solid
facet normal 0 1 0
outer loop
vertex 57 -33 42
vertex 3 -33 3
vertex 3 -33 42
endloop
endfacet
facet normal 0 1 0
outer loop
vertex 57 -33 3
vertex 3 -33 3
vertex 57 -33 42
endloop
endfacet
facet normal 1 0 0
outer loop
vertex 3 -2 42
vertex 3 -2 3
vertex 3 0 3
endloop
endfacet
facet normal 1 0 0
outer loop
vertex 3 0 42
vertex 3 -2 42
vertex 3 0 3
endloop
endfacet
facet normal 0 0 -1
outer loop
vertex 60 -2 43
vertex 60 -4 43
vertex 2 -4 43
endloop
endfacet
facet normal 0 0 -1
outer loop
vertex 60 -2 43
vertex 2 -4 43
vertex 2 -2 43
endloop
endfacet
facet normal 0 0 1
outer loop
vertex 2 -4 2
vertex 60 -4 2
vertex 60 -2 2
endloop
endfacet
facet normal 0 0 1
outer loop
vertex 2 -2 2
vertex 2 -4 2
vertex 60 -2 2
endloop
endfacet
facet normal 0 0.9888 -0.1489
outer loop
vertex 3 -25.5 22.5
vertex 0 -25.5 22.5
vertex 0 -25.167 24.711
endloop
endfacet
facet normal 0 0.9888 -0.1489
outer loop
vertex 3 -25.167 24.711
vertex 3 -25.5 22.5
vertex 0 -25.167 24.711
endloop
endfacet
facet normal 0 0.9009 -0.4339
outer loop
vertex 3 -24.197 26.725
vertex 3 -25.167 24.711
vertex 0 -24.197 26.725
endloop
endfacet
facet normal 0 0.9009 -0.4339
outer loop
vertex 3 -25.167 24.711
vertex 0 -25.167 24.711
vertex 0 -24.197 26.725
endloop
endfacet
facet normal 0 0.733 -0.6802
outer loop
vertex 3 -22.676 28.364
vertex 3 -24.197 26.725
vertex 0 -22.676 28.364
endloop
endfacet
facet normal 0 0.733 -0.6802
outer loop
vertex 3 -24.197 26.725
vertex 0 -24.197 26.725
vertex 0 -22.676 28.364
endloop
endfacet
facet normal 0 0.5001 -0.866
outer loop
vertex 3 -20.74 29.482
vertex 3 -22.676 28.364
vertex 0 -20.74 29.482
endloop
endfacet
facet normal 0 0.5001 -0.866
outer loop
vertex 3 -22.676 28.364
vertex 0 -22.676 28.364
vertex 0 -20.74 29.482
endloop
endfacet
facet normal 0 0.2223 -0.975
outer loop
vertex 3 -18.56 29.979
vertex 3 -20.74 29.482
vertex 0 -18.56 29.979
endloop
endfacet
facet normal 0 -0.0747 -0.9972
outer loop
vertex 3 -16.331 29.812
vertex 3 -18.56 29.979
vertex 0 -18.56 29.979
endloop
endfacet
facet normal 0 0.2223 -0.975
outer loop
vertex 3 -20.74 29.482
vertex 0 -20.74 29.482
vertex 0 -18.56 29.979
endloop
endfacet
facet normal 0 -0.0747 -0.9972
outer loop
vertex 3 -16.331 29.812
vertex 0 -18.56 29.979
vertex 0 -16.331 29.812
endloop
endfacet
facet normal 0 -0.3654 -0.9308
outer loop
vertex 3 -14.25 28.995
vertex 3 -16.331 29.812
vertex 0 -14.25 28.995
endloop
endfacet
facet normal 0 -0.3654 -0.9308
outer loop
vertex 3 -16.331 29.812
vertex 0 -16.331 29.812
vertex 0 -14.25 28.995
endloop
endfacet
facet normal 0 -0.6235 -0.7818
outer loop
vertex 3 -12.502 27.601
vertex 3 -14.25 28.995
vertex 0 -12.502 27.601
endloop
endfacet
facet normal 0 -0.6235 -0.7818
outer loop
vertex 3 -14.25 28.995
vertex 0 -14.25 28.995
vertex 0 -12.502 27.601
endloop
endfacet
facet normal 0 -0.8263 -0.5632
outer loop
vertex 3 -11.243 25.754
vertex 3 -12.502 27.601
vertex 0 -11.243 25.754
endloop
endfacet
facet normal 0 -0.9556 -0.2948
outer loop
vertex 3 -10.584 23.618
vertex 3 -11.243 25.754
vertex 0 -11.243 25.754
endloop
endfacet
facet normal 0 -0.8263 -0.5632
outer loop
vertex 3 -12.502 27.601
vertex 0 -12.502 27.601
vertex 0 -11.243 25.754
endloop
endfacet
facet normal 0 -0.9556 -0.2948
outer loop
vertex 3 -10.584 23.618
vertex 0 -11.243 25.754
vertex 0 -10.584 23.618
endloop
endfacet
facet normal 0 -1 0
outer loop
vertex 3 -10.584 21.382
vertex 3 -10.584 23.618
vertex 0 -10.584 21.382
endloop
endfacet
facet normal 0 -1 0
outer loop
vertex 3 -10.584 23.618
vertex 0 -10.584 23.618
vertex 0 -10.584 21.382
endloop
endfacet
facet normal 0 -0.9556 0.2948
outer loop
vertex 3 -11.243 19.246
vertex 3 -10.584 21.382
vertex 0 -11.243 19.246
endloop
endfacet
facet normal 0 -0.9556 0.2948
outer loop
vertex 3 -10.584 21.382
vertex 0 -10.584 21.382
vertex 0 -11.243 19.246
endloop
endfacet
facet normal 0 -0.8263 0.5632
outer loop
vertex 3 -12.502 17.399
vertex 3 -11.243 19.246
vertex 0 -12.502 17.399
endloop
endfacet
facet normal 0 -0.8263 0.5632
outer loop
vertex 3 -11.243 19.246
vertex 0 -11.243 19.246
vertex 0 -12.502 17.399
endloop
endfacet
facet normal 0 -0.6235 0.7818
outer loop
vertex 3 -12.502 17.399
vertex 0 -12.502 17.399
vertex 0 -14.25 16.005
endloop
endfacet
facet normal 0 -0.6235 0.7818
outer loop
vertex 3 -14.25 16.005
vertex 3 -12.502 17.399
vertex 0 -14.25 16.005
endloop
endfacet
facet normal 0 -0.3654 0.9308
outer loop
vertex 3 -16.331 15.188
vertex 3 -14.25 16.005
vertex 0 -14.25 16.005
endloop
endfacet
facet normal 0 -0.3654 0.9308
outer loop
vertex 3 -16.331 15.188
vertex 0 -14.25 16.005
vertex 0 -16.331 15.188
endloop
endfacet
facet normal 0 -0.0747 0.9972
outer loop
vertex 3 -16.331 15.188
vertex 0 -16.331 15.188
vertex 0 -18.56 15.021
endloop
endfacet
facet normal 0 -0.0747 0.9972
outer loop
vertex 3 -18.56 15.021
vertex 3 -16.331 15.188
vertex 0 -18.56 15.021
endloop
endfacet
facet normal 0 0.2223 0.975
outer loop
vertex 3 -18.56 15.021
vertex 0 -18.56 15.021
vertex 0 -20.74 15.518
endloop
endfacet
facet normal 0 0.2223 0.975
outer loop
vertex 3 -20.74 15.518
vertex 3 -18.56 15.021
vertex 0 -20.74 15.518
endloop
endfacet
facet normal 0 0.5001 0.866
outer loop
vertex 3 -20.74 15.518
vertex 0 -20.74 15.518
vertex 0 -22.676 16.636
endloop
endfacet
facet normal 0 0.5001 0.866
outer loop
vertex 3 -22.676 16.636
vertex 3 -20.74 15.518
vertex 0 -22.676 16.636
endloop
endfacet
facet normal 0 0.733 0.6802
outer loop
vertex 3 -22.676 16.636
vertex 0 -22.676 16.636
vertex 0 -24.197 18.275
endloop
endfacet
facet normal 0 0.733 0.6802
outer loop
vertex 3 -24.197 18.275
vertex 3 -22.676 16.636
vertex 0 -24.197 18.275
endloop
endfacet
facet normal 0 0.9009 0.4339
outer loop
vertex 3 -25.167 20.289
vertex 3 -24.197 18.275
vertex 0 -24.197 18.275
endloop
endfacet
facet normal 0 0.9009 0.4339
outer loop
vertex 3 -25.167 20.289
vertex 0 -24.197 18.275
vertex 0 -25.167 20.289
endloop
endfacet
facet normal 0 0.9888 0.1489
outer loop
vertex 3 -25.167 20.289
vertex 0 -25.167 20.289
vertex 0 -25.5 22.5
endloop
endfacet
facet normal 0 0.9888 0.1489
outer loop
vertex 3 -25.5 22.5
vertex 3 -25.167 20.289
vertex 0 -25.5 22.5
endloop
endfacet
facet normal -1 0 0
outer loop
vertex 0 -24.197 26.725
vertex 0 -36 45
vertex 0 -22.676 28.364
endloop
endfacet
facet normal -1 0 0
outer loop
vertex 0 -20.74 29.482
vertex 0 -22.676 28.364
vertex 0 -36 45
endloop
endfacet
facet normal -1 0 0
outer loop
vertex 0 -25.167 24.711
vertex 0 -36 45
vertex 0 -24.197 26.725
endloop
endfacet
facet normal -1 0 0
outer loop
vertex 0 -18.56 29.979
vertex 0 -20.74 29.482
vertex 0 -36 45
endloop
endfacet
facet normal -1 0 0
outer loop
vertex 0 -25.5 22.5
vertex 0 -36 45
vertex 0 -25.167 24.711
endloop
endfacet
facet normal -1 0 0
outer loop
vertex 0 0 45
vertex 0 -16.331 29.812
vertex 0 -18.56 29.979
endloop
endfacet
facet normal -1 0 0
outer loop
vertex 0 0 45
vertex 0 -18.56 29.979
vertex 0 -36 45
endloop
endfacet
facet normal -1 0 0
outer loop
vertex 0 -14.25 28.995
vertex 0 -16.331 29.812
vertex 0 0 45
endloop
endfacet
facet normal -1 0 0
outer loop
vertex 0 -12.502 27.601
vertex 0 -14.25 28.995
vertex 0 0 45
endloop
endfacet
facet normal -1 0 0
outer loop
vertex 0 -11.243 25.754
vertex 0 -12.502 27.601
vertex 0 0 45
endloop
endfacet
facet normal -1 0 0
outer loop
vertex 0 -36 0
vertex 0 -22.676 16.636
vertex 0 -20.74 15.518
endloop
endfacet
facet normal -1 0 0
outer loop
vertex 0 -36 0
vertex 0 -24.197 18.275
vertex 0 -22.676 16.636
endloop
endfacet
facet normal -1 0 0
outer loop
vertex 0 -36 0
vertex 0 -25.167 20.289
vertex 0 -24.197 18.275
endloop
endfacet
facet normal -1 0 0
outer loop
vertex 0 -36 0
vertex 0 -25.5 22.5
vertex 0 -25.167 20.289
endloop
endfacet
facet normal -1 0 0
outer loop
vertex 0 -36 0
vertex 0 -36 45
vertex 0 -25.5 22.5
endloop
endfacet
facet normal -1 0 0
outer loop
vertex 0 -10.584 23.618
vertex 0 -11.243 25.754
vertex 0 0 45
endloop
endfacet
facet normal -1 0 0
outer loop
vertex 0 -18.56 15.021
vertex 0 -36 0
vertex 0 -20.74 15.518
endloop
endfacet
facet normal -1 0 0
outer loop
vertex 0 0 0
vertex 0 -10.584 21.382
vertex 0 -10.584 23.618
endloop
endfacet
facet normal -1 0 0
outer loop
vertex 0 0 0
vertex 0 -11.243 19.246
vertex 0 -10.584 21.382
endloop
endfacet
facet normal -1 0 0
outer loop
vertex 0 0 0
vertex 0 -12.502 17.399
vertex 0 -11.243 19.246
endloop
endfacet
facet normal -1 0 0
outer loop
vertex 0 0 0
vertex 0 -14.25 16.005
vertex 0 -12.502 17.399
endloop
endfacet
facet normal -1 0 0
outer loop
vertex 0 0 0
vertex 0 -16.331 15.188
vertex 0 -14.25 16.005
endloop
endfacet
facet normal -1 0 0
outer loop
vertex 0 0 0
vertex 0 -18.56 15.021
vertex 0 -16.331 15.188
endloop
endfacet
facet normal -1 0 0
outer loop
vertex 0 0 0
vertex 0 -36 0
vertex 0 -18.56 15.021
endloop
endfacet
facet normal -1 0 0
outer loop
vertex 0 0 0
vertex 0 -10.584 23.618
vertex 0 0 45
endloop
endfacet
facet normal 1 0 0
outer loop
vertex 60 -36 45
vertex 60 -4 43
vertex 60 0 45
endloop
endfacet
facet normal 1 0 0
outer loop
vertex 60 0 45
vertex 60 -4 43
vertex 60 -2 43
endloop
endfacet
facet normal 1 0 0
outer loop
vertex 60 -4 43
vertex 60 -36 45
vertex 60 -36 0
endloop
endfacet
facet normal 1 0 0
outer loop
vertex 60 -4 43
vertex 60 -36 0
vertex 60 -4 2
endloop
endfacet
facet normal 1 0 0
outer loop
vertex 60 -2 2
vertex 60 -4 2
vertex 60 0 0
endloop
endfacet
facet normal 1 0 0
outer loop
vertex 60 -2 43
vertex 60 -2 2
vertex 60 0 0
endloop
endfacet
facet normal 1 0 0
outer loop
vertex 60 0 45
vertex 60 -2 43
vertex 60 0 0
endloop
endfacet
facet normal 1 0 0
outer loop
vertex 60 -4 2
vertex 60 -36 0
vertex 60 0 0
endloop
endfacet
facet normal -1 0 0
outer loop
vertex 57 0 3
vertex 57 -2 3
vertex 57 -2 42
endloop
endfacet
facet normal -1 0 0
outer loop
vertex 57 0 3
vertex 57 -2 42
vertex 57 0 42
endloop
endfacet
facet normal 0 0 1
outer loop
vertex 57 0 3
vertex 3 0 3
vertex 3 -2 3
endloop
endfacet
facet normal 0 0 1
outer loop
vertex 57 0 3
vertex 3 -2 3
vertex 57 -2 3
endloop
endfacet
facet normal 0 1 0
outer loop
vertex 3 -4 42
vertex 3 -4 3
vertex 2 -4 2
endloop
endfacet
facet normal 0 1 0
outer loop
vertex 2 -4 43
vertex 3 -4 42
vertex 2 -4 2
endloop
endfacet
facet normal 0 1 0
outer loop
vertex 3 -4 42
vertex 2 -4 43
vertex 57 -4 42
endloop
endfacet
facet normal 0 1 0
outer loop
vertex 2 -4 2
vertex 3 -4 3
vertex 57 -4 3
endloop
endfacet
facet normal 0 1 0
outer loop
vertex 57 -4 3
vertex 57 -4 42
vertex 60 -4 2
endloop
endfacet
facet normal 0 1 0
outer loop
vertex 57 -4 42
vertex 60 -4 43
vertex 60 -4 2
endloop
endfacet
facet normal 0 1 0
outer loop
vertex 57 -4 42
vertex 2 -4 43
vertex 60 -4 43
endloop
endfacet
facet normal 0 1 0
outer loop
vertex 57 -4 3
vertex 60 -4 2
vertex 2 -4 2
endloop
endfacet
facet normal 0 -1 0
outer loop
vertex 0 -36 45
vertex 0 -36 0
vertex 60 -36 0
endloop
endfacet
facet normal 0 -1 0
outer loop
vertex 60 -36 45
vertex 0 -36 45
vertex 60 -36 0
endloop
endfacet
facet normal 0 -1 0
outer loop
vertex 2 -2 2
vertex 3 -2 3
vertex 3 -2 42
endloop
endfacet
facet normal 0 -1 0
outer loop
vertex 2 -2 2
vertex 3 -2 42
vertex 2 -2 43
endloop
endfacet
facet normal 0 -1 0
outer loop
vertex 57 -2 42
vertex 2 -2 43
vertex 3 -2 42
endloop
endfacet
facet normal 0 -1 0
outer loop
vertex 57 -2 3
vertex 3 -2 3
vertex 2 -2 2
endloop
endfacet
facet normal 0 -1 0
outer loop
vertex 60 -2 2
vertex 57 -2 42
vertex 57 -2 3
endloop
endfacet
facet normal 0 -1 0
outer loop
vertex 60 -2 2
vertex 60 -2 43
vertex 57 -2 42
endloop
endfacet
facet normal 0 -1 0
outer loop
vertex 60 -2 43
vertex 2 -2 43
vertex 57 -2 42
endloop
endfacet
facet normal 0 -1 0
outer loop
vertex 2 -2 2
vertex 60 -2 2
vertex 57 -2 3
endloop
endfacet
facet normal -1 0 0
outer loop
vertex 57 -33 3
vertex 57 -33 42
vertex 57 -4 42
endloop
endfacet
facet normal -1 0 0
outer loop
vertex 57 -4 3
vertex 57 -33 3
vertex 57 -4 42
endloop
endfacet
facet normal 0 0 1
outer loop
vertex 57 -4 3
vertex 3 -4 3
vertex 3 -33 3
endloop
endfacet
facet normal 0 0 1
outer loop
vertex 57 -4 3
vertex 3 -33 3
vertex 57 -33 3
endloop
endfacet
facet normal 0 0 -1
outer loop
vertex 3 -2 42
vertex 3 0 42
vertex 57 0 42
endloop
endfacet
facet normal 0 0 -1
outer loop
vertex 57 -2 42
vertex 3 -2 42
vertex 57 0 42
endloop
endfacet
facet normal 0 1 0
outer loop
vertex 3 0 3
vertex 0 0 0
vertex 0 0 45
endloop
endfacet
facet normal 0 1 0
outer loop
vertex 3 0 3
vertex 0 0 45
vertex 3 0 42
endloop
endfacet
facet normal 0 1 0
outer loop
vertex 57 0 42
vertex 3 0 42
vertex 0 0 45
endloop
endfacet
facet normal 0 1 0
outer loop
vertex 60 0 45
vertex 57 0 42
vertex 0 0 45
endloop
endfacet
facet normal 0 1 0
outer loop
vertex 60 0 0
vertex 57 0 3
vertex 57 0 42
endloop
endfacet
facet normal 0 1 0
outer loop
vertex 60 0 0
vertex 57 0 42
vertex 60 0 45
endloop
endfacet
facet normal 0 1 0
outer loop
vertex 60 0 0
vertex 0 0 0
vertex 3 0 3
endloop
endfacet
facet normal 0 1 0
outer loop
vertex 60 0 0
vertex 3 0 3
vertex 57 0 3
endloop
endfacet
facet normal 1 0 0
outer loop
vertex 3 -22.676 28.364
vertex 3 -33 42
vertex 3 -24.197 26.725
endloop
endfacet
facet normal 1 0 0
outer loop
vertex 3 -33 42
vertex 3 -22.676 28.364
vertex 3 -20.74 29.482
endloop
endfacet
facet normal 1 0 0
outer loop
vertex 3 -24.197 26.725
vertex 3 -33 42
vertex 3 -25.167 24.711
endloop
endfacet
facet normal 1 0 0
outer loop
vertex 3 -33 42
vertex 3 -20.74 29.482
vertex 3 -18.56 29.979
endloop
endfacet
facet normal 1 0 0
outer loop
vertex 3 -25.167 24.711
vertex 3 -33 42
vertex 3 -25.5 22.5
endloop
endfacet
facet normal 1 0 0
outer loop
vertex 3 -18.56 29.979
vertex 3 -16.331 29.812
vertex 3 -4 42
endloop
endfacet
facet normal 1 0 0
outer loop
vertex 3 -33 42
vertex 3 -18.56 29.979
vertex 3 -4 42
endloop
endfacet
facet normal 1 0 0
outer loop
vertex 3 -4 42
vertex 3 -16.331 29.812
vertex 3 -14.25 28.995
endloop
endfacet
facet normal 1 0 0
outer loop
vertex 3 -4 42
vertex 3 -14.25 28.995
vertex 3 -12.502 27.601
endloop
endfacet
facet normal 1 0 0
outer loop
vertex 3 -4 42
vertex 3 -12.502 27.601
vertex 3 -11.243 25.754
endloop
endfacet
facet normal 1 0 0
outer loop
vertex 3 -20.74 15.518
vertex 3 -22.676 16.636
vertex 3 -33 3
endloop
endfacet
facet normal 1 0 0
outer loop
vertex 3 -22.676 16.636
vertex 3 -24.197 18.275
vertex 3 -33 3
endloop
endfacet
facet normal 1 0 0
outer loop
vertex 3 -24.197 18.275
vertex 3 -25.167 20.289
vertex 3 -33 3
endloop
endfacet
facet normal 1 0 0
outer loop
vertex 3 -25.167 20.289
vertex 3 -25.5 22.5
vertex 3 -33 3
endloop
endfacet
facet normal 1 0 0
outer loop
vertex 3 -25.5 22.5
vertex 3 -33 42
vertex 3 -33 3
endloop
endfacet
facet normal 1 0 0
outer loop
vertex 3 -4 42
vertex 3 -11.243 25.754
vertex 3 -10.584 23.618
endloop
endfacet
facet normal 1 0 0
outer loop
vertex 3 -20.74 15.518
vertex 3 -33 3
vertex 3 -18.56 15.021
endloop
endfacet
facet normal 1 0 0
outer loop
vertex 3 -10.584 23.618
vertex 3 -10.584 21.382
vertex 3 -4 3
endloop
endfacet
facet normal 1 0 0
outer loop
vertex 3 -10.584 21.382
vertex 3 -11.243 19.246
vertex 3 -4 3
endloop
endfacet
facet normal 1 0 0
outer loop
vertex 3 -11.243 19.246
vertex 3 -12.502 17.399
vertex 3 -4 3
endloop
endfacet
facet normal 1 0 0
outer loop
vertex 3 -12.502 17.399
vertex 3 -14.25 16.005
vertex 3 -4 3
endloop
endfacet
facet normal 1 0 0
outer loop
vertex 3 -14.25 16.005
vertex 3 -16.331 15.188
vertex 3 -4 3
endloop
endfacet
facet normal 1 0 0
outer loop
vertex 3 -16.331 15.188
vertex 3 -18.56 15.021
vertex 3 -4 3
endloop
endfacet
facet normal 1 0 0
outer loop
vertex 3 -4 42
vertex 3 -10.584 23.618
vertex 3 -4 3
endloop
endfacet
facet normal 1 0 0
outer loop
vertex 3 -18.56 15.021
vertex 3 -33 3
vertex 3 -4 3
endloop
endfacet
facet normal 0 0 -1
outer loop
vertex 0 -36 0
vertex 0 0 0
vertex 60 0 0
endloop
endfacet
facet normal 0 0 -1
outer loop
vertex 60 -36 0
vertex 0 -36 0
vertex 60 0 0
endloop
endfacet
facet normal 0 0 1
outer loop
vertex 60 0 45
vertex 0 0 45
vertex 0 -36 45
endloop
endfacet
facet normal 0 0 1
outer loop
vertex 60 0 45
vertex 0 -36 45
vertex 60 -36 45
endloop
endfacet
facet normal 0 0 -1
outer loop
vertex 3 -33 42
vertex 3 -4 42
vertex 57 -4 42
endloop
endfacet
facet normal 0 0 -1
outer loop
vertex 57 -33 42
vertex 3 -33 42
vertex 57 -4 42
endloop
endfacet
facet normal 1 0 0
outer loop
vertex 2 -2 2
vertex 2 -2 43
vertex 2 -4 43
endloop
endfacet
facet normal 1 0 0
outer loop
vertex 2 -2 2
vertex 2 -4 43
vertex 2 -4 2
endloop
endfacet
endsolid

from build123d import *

# Parameters (mm, degrees)
SKETCH1_W           = 60
SKETCH1_H           = 36
BOSS_EXTRUDE1_DEPTH = 45
SHELL1_T            = -3
SKETCH2_W           = 41
SKETCH2_H           = 2
CUT_EXTRUDE1_DEPTH  = 58
SKETCH3_R           = 7.5
CUT_EXTRUDE2_DEPTH  = 48


with BuildPart() as part:
    # Sketch1 → Boss-Extrude1 (new body)
    with BuildSketch(Plane.XY):
        with Locations((30, -18)):
            Rectangle(SKETCH1_W, SKETCH1_H)
    extrude(amount=BOSS_EXTRUDE1_DEPTH)

    # Shell1
    shell1_openings = [part.faces().sort_by_distance(p)[0] for p in [
        (30, 0, 22.5),
    ]]
    offset(amount=SHELL1_T, openings=shell1_openings, kind=Kind.INTERSECTION)

    # Sketch2 → Cut-Extrude1 (cut)
    with BuildSketch(Plane(origin=(60, 0, 0), x_dir=(0, 0, -1), z_dir=(1, 0, 0))):
        with Locations((-22.5, -3)):
            Rectangle(SKETCH2_W, SKETCH2_H)
    extrude(amount=-CUT_EXTRUDE1_DEPTH, mode=Mode.SUBTRACT)

    # Sketch3 → Cut-Extrude2 (cut)
    with BuildSketch(Plane.ZY):
        with Locations(Location((22.5, -18, 0), (0, 0, 270))):
            Circle(SKETCH3_R)
    extrude(amount=-CUT_EXTRUDE2_DEPTH, mode=Mode.SUBTRACT)


solid = part.part
